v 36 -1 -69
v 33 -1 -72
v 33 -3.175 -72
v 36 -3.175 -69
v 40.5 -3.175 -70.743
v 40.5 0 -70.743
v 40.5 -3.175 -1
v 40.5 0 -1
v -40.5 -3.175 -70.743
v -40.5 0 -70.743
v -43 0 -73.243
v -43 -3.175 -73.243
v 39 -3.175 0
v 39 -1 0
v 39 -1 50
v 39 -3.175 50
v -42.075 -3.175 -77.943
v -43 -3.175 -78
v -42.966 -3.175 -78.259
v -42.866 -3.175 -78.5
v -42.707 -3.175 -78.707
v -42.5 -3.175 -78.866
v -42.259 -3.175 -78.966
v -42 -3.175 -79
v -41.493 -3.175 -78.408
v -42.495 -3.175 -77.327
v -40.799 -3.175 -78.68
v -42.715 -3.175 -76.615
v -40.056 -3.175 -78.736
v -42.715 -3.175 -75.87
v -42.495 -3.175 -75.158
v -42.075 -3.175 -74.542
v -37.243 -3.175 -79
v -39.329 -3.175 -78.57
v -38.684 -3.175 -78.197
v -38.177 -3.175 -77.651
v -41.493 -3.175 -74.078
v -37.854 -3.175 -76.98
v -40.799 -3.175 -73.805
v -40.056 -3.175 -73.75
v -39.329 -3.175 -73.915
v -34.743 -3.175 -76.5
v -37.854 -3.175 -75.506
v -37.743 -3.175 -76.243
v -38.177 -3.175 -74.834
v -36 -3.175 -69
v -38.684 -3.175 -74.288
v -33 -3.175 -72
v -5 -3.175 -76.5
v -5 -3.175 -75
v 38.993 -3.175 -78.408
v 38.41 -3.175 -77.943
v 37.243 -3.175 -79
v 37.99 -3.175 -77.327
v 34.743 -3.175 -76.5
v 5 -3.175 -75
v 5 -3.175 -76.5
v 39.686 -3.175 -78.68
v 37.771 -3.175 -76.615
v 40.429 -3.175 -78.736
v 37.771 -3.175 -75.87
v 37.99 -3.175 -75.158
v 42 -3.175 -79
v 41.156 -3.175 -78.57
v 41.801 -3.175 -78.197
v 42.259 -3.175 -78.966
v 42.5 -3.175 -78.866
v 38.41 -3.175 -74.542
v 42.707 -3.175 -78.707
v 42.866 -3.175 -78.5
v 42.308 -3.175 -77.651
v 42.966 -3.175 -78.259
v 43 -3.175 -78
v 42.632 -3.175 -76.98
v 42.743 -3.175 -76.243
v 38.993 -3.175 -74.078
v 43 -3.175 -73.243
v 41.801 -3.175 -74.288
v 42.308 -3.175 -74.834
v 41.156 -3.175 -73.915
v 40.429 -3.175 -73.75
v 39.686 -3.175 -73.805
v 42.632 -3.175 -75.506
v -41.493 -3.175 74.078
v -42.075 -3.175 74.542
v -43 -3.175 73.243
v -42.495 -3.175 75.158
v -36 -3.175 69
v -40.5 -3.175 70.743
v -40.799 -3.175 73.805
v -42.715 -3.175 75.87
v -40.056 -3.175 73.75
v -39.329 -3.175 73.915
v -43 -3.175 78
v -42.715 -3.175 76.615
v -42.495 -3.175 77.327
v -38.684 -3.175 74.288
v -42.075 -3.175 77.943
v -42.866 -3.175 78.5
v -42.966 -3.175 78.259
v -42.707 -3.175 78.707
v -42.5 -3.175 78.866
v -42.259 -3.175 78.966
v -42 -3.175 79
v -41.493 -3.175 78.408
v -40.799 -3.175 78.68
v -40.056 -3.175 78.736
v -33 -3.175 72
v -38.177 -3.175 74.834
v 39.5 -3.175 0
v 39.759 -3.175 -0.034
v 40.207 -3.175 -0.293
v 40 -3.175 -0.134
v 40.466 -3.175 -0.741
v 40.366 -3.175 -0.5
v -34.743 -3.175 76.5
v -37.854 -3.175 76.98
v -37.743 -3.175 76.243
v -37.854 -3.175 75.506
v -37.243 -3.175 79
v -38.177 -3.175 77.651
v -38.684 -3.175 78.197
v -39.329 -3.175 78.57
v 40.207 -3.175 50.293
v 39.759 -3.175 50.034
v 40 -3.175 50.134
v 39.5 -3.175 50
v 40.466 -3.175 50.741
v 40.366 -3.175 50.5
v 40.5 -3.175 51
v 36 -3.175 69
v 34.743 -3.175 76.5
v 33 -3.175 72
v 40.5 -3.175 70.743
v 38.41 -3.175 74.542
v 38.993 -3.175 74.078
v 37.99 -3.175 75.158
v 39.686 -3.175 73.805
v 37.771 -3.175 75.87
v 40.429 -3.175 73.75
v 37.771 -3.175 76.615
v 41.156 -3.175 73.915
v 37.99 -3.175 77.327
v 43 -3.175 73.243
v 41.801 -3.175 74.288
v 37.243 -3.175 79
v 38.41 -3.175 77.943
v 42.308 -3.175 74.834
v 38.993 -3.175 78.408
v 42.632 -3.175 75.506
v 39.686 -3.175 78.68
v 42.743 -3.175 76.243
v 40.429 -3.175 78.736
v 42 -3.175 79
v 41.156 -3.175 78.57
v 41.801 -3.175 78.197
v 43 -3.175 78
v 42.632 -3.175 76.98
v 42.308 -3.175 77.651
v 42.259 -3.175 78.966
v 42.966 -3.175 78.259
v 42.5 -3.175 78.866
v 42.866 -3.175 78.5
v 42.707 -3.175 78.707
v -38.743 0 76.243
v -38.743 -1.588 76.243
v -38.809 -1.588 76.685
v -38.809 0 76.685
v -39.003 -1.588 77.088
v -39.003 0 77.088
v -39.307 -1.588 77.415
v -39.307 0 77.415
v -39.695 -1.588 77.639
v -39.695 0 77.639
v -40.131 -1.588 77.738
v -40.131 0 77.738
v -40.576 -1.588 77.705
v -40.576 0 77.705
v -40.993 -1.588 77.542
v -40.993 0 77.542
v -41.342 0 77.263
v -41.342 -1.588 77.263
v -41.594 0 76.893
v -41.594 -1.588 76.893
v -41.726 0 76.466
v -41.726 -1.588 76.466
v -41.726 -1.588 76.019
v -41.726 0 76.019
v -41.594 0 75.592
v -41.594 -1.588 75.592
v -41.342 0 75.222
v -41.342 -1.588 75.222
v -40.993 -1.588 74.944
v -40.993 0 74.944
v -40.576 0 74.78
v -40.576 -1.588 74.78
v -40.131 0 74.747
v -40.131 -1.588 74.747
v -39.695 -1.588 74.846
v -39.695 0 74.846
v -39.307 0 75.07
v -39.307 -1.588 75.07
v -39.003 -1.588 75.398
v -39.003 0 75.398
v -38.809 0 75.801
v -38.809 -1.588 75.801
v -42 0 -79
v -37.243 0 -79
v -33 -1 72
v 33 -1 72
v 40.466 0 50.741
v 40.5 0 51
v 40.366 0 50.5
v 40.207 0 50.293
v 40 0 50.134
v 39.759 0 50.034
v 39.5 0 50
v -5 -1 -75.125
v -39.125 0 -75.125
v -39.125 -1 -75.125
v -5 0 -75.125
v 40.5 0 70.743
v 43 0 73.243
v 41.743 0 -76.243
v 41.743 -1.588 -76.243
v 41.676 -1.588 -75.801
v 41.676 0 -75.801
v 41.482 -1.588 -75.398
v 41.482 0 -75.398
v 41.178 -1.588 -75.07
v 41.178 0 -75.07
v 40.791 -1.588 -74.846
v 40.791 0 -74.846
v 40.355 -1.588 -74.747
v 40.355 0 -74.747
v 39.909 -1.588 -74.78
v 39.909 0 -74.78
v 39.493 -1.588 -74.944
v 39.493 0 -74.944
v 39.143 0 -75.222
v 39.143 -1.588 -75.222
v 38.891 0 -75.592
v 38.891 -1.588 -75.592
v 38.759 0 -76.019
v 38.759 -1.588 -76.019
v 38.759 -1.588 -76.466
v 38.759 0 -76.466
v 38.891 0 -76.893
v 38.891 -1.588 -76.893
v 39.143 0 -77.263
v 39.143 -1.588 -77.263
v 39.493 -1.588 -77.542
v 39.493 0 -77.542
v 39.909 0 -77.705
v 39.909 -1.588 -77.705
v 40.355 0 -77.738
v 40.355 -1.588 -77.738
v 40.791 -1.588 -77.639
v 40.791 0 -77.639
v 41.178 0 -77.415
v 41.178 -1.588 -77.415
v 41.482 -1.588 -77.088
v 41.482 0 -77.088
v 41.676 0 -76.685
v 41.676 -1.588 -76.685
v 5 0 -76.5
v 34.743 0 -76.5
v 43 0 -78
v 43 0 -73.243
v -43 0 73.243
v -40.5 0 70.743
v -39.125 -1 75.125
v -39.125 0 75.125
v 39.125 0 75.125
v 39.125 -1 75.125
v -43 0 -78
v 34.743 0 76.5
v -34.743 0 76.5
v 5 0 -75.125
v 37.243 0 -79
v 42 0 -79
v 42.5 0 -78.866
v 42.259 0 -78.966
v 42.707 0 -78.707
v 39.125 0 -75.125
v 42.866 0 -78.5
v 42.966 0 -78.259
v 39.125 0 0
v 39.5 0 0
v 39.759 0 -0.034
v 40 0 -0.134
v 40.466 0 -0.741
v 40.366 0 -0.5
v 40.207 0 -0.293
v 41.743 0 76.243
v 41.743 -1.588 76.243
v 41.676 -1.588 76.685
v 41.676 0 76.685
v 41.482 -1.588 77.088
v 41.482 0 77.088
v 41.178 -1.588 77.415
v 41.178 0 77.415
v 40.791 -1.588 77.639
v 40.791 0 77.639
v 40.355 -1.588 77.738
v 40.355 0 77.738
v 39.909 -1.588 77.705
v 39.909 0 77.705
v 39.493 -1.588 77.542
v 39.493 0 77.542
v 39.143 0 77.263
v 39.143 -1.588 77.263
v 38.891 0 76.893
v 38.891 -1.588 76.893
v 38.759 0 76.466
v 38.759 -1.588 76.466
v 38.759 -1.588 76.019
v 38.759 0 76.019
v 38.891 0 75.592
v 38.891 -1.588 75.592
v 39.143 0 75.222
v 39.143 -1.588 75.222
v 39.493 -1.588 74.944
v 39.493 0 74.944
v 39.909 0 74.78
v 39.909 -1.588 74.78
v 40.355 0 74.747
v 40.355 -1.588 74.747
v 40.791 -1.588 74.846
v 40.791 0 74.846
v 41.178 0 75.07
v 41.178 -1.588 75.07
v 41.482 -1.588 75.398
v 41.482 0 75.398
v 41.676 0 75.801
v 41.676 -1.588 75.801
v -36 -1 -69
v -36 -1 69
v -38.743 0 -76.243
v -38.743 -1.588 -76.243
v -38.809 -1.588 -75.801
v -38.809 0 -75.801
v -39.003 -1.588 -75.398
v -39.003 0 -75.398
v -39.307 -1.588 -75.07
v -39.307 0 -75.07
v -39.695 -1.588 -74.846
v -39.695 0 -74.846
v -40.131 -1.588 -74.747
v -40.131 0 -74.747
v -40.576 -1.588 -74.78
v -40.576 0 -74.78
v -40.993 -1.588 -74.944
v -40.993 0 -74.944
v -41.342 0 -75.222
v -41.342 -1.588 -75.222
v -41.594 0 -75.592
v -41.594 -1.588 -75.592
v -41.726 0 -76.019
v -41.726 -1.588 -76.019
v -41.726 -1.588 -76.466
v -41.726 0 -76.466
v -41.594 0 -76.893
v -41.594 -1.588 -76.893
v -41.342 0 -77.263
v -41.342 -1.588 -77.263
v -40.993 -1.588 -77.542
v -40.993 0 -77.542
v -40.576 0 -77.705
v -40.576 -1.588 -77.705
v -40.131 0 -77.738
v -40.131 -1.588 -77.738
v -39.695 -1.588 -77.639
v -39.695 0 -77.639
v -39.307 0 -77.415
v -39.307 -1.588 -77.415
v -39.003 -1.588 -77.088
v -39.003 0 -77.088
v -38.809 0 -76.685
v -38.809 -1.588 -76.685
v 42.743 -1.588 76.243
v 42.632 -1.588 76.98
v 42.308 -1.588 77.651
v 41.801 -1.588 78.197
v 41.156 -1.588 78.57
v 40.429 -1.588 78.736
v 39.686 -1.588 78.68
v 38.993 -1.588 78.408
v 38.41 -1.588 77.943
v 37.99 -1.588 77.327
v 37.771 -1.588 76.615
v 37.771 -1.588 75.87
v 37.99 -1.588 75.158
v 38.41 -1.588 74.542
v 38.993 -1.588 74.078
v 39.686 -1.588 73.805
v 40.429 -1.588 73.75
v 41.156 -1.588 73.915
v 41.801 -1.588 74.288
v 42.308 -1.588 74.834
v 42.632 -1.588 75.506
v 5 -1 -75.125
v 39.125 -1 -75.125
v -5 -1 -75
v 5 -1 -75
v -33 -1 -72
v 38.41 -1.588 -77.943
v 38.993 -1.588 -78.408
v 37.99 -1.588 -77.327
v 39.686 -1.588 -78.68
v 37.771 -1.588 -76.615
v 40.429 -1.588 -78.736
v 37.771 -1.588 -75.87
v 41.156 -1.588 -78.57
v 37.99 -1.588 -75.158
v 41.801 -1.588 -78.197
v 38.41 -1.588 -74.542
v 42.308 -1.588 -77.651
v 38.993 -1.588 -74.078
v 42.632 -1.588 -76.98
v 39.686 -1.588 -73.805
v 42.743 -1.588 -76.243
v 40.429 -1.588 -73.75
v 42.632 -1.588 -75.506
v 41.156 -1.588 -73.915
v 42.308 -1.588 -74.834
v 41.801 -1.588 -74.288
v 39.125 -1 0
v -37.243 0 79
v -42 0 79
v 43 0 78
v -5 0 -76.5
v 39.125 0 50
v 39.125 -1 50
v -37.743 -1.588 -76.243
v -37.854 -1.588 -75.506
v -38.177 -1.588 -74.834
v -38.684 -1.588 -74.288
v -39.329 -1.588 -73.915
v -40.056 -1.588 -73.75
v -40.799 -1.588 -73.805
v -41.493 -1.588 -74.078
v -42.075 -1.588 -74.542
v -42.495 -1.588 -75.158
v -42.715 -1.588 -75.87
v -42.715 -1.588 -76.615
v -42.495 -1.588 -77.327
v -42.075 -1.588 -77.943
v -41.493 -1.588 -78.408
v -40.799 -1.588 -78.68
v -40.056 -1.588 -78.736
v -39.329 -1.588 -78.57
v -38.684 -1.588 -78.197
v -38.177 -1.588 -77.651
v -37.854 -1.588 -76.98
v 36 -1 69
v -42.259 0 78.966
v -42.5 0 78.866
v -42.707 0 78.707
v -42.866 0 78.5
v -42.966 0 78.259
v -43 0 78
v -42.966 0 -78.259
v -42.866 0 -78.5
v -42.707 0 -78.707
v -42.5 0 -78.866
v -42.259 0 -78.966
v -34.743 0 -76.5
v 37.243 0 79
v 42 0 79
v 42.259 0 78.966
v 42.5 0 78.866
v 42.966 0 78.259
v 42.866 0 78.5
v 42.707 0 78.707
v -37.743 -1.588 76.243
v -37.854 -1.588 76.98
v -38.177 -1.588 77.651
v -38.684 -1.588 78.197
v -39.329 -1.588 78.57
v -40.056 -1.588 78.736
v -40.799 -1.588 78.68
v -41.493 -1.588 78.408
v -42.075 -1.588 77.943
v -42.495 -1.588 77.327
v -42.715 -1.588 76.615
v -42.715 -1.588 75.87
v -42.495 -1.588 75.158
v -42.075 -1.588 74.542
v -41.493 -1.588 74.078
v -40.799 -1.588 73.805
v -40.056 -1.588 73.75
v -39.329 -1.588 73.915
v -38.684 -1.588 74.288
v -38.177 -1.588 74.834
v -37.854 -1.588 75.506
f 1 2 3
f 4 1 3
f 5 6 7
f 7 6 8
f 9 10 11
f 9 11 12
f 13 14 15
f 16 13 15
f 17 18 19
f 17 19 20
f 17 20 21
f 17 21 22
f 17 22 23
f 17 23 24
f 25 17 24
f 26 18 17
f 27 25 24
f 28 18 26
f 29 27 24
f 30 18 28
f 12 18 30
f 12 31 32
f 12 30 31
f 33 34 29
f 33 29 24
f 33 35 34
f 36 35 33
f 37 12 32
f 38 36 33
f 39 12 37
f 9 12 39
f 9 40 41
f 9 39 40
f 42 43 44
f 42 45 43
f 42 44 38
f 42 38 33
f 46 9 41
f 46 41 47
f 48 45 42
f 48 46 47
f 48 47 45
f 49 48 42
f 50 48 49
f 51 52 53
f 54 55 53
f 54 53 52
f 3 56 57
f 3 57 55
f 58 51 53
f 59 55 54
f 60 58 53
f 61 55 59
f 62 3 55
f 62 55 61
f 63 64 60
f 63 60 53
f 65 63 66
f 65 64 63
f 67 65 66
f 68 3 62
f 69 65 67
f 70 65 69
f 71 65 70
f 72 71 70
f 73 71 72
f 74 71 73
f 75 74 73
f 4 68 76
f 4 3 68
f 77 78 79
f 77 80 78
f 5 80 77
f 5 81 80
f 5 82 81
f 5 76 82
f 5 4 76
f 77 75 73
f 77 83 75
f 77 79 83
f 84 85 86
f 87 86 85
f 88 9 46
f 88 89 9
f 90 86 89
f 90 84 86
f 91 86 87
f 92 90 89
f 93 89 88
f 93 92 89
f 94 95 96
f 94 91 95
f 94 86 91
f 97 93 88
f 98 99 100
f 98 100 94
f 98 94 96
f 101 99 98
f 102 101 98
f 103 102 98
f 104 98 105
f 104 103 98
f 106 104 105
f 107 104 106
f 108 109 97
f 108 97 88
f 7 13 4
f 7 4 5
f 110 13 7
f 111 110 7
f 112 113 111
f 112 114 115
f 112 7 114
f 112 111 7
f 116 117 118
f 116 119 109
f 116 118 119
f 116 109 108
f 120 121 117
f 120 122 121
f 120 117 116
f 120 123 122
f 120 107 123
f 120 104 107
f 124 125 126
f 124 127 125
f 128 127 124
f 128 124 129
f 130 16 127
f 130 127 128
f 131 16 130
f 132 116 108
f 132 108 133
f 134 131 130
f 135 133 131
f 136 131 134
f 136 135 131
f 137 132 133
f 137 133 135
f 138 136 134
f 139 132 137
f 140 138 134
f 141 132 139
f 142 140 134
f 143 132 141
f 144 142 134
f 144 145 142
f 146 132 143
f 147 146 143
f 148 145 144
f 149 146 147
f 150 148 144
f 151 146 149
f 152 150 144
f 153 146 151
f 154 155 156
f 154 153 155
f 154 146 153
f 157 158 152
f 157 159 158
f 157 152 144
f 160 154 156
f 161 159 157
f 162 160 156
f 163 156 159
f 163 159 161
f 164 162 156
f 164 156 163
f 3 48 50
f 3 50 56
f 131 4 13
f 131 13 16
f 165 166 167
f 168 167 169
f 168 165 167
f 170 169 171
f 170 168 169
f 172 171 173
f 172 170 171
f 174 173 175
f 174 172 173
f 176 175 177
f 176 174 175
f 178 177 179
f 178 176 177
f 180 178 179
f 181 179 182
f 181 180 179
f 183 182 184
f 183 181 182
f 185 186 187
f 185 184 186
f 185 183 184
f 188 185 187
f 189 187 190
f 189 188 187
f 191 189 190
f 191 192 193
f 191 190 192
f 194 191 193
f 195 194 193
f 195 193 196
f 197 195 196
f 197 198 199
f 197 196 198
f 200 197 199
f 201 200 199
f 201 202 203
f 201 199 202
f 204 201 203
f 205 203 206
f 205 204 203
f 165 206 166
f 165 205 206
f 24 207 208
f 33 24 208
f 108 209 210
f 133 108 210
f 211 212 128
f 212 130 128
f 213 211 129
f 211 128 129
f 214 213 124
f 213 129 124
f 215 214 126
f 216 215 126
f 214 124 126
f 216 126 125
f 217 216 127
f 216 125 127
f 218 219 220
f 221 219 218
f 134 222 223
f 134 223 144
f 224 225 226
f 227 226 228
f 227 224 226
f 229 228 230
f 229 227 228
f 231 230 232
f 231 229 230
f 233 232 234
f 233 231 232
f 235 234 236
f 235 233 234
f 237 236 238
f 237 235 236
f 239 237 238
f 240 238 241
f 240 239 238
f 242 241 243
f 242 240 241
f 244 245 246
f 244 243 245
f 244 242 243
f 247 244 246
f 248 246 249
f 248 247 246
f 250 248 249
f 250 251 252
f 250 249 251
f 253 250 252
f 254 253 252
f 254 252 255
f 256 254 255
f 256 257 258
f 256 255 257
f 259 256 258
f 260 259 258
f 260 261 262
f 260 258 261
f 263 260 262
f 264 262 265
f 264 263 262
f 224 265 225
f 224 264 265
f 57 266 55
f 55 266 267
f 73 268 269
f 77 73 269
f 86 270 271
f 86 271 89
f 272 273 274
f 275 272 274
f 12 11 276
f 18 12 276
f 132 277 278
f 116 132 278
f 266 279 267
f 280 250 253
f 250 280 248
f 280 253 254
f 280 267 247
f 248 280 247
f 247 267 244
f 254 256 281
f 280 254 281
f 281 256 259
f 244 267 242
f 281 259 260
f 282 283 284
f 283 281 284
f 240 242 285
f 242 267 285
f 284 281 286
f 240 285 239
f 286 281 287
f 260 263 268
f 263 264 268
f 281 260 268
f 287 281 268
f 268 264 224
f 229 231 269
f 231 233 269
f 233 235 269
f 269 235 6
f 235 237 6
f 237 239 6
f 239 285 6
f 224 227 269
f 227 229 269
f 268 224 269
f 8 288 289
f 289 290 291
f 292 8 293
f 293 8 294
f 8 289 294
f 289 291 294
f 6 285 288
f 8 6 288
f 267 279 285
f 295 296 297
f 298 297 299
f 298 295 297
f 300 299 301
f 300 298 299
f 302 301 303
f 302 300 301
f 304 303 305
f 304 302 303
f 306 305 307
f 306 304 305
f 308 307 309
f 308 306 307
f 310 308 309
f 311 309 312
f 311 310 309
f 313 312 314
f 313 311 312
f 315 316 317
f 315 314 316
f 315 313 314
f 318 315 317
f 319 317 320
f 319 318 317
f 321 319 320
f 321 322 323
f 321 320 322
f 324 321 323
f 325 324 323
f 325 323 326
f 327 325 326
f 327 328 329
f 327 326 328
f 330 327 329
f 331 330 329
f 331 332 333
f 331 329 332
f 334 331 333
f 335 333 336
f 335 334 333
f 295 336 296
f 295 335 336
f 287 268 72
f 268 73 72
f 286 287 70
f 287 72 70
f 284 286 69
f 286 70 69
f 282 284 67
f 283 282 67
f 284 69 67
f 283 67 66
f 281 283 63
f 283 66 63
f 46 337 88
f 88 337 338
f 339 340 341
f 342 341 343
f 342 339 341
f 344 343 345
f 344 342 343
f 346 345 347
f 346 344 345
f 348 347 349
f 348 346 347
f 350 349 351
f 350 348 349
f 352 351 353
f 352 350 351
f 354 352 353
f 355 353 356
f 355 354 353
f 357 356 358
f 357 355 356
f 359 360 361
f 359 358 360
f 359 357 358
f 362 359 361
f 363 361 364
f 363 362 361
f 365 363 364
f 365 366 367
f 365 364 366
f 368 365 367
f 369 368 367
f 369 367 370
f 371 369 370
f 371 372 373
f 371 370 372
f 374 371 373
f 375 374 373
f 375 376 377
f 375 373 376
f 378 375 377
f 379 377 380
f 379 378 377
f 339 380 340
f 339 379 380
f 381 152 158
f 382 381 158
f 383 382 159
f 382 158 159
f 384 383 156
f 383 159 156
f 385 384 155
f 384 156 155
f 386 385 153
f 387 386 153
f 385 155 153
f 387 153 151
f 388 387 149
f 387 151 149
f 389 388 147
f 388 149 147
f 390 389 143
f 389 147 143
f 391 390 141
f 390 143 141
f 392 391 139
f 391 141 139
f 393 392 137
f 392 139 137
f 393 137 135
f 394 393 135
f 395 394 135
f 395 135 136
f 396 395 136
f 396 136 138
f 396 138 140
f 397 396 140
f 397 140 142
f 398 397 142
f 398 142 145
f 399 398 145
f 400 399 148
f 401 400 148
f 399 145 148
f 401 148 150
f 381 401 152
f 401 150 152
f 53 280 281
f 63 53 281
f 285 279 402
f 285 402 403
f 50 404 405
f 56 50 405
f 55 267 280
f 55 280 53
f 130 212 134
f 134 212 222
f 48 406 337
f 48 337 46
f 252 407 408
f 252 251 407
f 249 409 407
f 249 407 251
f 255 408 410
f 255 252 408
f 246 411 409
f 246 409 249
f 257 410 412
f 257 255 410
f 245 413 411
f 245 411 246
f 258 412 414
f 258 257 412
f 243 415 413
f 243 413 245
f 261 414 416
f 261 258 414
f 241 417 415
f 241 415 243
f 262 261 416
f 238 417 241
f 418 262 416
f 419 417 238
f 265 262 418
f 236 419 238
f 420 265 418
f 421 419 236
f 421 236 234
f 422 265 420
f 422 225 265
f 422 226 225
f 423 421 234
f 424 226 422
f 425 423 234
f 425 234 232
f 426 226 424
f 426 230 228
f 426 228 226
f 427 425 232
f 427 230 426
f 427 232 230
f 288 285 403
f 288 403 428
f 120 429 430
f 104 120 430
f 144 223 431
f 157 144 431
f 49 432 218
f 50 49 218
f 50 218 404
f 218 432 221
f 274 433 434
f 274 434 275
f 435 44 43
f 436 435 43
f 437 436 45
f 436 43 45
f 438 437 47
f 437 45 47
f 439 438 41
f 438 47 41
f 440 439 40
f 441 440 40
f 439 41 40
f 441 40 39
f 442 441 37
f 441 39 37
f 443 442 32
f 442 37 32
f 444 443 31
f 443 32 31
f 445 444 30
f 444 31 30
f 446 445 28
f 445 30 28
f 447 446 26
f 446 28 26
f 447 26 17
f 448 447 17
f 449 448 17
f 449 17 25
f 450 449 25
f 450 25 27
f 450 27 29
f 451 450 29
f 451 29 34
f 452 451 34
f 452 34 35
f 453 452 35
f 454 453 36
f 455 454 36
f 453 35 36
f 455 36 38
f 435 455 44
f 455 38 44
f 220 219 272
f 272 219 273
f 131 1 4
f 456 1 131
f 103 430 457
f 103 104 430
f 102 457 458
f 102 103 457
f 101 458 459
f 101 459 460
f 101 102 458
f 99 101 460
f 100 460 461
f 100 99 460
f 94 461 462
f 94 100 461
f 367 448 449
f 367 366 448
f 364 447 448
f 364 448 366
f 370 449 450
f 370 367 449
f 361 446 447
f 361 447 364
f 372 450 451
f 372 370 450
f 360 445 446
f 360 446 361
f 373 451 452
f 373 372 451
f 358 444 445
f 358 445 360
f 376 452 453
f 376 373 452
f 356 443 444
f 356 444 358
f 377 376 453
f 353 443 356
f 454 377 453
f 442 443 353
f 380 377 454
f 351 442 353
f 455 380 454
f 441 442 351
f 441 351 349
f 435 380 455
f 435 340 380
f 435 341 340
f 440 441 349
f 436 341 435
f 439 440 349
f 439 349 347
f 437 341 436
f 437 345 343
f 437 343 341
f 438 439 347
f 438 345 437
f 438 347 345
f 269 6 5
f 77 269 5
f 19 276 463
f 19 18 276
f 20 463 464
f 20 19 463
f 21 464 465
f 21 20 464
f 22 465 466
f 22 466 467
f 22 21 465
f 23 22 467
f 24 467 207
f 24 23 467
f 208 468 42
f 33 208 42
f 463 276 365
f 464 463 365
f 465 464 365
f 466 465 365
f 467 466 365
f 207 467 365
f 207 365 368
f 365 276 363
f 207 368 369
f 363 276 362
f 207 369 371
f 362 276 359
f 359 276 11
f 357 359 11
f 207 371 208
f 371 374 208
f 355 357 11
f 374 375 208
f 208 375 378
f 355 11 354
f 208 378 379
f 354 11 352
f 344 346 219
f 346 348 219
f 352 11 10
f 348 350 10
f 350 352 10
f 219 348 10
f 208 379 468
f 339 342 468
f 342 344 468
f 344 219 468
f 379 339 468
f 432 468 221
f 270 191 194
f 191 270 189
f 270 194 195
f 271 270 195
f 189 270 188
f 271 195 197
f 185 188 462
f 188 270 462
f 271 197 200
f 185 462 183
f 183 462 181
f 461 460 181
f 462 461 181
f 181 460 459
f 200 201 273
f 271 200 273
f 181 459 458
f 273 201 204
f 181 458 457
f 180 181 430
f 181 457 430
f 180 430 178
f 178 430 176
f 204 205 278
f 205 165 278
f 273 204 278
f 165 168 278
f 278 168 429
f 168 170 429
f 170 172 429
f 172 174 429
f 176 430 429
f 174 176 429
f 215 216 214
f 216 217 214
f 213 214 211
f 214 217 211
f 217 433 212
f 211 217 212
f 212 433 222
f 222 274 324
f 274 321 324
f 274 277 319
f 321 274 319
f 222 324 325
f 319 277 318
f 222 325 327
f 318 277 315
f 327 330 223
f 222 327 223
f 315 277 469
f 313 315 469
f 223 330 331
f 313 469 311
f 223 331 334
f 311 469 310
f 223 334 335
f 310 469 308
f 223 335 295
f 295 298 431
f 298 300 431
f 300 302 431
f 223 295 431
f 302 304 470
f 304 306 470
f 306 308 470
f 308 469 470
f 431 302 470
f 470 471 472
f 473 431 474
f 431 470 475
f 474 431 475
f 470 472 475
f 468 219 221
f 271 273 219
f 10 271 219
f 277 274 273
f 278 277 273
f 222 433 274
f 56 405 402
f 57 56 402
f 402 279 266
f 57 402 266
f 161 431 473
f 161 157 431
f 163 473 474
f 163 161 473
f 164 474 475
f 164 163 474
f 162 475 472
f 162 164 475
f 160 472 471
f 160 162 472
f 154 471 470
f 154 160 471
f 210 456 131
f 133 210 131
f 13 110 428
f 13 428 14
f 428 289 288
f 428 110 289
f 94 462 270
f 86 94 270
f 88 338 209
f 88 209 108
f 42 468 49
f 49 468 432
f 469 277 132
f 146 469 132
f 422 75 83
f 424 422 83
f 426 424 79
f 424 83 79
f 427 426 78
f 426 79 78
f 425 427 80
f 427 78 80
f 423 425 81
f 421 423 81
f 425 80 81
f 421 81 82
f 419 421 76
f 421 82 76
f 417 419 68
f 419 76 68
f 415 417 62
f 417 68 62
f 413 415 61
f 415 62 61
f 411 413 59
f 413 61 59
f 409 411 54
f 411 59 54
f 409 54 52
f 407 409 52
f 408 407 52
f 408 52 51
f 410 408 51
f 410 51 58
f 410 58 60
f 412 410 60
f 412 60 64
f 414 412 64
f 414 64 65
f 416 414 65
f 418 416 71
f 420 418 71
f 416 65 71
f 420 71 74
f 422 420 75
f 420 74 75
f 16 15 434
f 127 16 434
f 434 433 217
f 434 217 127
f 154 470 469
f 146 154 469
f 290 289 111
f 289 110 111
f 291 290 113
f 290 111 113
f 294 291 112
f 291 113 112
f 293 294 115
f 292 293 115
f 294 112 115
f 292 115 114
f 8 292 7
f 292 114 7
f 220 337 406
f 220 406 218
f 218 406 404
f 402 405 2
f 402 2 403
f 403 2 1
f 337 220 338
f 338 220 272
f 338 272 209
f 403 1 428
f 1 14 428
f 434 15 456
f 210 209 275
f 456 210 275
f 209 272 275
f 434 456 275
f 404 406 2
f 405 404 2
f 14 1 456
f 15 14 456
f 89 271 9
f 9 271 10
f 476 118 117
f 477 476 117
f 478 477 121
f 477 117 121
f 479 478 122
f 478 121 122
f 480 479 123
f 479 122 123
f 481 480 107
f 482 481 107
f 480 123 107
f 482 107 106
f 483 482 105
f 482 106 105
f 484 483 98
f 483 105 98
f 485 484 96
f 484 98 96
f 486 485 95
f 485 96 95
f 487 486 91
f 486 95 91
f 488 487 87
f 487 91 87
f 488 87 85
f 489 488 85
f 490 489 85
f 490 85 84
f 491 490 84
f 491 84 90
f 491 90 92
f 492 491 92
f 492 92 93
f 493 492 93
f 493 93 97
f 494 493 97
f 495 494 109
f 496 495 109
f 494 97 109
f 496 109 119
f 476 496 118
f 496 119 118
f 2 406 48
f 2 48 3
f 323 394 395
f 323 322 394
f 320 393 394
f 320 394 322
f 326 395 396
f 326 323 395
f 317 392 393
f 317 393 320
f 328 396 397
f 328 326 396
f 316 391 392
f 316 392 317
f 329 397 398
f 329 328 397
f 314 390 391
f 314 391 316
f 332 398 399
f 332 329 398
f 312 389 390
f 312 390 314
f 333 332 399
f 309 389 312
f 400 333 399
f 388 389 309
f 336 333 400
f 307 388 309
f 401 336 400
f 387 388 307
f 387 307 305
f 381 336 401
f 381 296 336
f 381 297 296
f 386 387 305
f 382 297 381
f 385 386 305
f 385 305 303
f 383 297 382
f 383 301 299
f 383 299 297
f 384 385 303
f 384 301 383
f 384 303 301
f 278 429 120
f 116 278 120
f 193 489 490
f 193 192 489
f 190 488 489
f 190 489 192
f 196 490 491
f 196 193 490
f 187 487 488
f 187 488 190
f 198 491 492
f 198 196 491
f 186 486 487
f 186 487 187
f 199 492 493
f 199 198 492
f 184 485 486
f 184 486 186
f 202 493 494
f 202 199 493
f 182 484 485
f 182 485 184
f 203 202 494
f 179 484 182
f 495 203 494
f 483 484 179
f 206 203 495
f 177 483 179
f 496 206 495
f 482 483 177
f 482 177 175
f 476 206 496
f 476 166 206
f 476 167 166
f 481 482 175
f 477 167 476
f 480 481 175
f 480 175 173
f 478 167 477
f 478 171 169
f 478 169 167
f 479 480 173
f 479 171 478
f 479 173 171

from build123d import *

# Parameters (mm, degrees)
F1_R     = 1.5
F1_W     = 72
F1_H     = 144
F2_DEPTH = 3.175
F3_SIZE  = 3
F4_SIZE  = 2.49999
F5_R     = 1
F6_R     = 2.5
F7_DEPTH = 1.5875
F8_W     = 78.25
F8_H     = 150.25
F9_DEPTH = 1


# Not quite as in the source:
# - a fillet or chamfer is up to 0.001 mm smaller than in the source, because OpenCascade refuses the exact size


with BuildPart() as f2:
    # F1 (on Front) → F2 (new body)
    with BuildSketch(Plane.XZ):
        Polygon((43, 73.2426406871), (43, 79), (37.2426406871, 79), (37.2426406871, 76.5), (-37.2426406871, 76.5), (-37.2426406871, 79), (-43, 79), (-43, 73.2426406871), (-40.5, 73.2426406871), (-40.5, -73.2426406871), (-43, -73.2426406871), (-43, -79), (-37.2426406871, -79), (-37.2426406871, -76.5), (-5, -76.5), (-5, -75), (5, -75), (5, -76.5), (37.2426406871, -76.5), (37.2426406871, -79), (43, -79), (43, -73.2426406871), (40.5, -73.2426406871), (40.5, 0), (39, 0), (39, 50), (40.5, 50), (40.5, 73.2426406871), align=None)
        with Locations((-40.2426406871, -76.2426406871)):
            Circle(F1_R, mode=Mode.SUBTRACT)
        with Locations((40.2426406871, -76.2426406871)):
            Circle(F1_R, mode=Mode.SUBTRACT)
        with Locations((-40.2426406871, 76.2426406871)):
            Circle(F1_R, mode=Mode.SUBTRACT)
        Rectangle(F1_W, F1_H, mode=Mode.SUBTRACT)
        with Locations((40.2426406871, 76.2426406871)):
            Circle(F1_R, mode=Mode.SUBTRACT)
    extrude(amount=F2_DEPTH)

    # F3
    f3_edges = [f2.edges().sort_by_distance(p)[0] for p in [
        (-36, -1.5875, 72),
        (36, -1.5875, 72),
        (36, -1.5875, -72),
        (-36, -1.5875, -72),
    ]]
    chamfer(f3_edges, length=F3_SIZE)

    # F4 (size 2.5 in the source; OpenCascade refuses exactly that, so slightly less here)
    f4_edges = [f2.edges().sort_by_distance(p)[0] for p in [
        (-37.242641, -1.5875, 76.5),
        (-40.5, -1.5875, 73.242641),
        (40.5, -1.5875, 73.242641),
        (37.242641, -1.5875, 76.5),
        (37.242641, -1.5875, -76.5),
        (40.5, -1.5875, -73.242641),
        (-40.5, -1.5875, -73.242641),
        (-37.242641, -1.5875, -76.5),
    ]]
    chamfer(f4_edges, length=F4_SIZE)

    # F5
    f5_edges = [f2.edges().sort_by_distance(p)[0] for p in [
        (-43, -1.5875, 79),
        (43, -1.5875, 79),
        (43, -1.5875, -79),
        (-43, -1.5875, -79),
        (40.5, -1.5875, 0),
        (40.5, -1.5875, 50),
    ]]
    fillet(f5_edges, radius=F5_R)

    # F6 (on face) → F7 (cut)
    with BuildSketch(Plane.XZ.offset(3.175)):
        with Locations((-40.2426406871, 76.2426406871)):
            Circle(F6_R)
        with Locations((40.2426406871, 76.2426406871)):
            Circle(F6_R)
        with Locations((40.2426406871, -76.2426406871)):
            Circle(F6_R)
        with Locations((-40.2426406871, -76.2426406871)):
            Circle(F6_R)
    extrude(amount=-F7_DEPTH, mode=Mode.SUBTRACT)

    # F8 (on face) → F9 (cut)
    with BuildSketch(Plane.XZ):
        Rectangle(F8_W, F8_H)
    extrude(amount=F9_DEPTH, mode=Mode.SUBTRACT)


solid = f2.part
